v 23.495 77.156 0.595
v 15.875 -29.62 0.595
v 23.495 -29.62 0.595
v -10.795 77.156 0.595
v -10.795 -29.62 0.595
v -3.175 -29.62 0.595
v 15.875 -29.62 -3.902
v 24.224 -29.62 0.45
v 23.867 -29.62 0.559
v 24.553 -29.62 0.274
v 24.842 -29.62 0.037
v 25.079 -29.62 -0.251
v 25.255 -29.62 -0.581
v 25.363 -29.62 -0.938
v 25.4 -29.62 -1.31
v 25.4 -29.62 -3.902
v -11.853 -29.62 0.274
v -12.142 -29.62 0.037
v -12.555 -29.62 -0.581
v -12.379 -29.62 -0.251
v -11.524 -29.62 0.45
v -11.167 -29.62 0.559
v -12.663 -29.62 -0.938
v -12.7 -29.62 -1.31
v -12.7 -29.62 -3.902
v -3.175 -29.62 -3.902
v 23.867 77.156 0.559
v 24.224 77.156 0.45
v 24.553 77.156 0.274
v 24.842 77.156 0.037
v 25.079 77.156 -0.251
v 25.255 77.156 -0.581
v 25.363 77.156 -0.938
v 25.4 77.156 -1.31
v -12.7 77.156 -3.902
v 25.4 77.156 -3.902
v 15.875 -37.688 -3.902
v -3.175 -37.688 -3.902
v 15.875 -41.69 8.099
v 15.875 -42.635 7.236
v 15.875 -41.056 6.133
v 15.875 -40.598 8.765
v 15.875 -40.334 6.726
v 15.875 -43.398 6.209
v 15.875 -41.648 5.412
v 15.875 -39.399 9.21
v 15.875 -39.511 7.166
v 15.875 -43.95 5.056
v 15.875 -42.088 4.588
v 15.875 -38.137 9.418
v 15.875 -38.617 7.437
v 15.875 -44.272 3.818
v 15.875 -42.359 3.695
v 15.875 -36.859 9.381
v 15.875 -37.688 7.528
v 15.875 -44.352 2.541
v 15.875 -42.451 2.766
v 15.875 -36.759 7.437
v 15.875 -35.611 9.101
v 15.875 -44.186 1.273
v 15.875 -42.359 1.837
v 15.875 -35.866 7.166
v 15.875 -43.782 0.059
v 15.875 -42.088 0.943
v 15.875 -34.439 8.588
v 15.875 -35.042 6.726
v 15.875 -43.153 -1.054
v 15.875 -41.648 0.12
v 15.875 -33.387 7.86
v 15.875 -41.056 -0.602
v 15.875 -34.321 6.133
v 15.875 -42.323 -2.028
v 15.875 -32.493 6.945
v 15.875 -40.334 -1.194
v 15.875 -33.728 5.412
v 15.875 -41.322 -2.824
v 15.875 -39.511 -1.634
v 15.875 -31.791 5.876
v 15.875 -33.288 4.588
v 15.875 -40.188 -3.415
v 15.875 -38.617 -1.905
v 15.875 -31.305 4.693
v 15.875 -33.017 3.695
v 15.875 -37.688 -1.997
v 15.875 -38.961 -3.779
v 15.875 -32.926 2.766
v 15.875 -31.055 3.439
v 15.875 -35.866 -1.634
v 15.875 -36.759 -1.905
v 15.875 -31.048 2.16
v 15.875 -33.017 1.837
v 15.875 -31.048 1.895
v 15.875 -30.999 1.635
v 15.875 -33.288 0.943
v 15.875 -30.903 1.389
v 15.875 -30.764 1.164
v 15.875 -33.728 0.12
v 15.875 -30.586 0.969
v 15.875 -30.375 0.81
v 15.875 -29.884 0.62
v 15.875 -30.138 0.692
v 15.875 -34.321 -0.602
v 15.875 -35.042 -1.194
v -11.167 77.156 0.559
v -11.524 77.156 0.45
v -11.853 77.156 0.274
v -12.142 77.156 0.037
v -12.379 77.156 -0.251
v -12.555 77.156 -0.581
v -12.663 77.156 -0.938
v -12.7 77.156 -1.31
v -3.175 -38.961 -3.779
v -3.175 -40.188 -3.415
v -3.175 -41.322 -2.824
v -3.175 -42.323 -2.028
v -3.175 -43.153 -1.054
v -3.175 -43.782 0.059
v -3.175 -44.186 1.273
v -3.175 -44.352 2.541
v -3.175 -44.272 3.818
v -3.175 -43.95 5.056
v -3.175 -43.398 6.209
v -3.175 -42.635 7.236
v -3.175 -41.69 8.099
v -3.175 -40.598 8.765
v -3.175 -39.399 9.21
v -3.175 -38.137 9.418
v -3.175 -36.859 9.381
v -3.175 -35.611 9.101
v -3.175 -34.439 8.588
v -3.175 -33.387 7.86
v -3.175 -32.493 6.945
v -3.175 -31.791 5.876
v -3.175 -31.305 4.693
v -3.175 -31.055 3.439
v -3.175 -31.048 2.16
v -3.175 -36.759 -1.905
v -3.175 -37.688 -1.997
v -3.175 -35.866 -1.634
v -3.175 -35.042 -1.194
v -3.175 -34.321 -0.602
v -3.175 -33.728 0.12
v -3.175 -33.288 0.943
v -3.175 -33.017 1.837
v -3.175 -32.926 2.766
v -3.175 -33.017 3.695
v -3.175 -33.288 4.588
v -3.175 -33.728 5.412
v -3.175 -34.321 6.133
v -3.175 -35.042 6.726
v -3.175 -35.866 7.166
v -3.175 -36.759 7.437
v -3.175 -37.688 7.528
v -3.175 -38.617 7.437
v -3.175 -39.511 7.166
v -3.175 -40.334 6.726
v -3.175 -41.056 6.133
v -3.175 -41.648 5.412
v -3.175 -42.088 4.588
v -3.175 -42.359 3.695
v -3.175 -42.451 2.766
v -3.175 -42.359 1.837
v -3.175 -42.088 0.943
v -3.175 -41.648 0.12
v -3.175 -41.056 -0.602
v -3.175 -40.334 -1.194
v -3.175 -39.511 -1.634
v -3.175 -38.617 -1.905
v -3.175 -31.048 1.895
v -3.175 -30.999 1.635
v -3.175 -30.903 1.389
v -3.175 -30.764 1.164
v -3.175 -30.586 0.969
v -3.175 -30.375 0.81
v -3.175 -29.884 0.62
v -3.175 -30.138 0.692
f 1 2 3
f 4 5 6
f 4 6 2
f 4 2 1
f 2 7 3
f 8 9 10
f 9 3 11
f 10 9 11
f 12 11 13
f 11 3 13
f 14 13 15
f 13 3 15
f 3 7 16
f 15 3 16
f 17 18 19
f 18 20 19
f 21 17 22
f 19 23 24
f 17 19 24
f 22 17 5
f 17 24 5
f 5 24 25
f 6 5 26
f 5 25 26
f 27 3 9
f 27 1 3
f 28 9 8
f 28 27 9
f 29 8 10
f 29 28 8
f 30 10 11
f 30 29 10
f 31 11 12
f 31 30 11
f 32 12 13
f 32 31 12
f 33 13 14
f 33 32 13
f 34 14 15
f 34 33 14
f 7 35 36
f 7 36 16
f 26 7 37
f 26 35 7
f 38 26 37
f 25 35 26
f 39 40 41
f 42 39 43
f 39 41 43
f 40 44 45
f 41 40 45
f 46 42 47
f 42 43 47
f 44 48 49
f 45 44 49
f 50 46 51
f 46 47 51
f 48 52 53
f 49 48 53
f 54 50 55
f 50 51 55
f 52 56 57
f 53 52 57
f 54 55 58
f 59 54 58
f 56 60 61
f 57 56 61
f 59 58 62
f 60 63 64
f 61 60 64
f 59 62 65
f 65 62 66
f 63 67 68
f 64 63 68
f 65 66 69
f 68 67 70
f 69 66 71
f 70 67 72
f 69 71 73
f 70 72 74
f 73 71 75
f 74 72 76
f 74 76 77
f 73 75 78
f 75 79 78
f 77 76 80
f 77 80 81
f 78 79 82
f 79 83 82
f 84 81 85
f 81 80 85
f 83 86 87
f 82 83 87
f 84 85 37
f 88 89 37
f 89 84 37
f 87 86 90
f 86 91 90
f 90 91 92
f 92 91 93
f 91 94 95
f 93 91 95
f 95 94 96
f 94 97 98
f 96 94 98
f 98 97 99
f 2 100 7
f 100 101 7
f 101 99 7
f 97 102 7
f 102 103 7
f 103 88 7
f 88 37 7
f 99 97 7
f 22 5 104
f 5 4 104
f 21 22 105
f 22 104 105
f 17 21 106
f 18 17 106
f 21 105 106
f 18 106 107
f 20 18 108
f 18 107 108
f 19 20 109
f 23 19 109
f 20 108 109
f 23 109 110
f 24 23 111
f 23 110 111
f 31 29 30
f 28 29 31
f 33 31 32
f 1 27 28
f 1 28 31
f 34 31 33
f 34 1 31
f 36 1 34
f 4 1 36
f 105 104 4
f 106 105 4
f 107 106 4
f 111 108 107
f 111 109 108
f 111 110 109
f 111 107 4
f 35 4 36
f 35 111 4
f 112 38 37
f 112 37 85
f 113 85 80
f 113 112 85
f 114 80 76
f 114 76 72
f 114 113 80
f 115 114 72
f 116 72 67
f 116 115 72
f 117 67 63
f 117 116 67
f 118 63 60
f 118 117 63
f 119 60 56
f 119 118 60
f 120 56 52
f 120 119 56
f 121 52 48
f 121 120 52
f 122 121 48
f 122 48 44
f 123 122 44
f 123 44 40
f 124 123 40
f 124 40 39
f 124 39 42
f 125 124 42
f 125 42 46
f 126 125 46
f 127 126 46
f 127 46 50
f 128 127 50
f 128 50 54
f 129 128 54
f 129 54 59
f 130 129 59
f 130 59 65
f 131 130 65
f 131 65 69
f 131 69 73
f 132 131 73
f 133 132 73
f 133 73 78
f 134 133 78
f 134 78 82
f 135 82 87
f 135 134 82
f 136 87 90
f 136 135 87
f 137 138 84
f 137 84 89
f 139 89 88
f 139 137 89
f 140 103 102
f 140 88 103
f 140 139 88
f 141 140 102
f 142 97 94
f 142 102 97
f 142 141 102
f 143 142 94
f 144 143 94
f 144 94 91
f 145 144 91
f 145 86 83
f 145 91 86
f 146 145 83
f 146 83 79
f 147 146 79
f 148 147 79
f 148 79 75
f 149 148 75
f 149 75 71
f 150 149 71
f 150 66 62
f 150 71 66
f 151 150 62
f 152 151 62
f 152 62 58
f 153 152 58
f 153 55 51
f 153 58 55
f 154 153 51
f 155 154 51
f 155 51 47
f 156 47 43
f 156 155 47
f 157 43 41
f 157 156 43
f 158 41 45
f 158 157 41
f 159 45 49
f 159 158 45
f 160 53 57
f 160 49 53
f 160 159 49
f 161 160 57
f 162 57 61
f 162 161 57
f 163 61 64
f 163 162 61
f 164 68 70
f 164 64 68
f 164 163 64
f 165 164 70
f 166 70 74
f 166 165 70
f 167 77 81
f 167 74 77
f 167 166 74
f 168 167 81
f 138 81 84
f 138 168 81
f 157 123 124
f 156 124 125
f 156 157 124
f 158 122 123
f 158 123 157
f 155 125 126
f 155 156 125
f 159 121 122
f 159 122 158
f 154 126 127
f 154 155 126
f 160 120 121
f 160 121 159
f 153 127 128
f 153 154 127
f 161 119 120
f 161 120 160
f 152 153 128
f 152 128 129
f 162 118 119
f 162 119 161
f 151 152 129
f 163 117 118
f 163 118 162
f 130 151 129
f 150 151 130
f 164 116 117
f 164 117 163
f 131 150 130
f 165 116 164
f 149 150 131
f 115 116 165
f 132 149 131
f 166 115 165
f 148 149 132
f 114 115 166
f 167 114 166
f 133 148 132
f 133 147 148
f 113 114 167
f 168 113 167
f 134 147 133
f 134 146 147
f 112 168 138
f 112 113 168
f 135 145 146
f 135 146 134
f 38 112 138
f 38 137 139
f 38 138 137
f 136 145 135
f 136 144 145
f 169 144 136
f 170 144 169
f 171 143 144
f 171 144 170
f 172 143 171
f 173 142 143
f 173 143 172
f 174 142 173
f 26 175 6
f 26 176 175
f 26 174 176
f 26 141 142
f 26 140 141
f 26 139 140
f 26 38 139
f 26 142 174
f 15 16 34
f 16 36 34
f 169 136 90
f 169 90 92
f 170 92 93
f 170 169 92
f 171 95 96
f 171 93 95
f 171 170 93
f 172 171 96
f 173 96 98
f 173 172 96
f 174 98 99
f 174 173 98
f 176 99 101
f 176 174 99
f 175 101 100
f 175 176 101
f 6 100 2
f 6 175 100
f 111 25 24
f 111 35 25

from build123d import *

# Parameters (mm, degrees)
SKETCH2_R               = 1.5875
BOSS_EXTRUDE1_DEPTH     = 12.7
CUT_EXTRUDE3_DEPTH      = 12.7
CUT_EXTRUDE3_DEPTH_BACK = 12.7
SKETCH4_W               = 3.175
SKETCH4_H               = 5.378529074
SKETCH4_W_2             = 3.429175225
FILLET4_R               = 0.635
SCALE1_SCALE            = 3


with BuildPart() as part:
    # Sketch2 → Boss-Extrude1 (new body)
    with BuildSketch(Plane(origin=(0, 0, 0), x_dir=(0, 0, -1), z_dir=(1, 0, 0))):
        with BuildLine():
            Line((0.7234417, 2.689264537), (0.7234417, 38.281333312))
            Line((0.7234417, 38.281333312), (2.2225, 38.281333312))
            Line((2.2225, 38.281333312), (2.2225, 0))
            ThreePointArc((2.2225, 0), (-1.641425032, -1.498409194), (0.202045455, 2.213297062))
            ThreePointArc((0.202045455, 2.213297062), (0.567726646, 2.33627761), (0.7234417, 2.689264537))
        make_face()
        Circle(SKETCH2_R, mode=Mode.SUBTRACT)
    extrude(amount=BOSS_EXTRUDE1_DEPTH)

    # Sketch4 → Cut-Extrude3 (cut, two sides: drawn at the far end of the back side and taken through both)
    with BuildSketch(Plane.XY.offset(-0.7234417).offset(-CUT_EXTRUDE3_DEPTH_BACK)):
        with Locations((1.5875, 0)):
            Rectangle(SKETCH4_W, SKETCH4_H)
        with Locations((11.239587612, 0)):
            Rectangle(SKETCH4_W_2, SKETCH4_H)
    extrude(amount=CUT_EXTRUDE3_DEPTH + CUT_EXTRUDE3_DEPTH_BACK, mode=Mode.SUBTRACT)

    # Fillet4
    fillet4_edges = [part.edges().sort_by_distance(p)[0] for p in [
        (12.7, 20.485298925, -0.7234417),
        (0, 20.485298925, -0.7234417),
    ]]
    fillet(fillet4_edges, radius=FILLET4_R)


with BuildPart() as part_1:
    # Scale1: scaled about (6.35, 18.844068161, -1.382882034)
    add(part.part.scale(SCALE1_SCALE).moved(Location((-12.7, -37.688136322, 2.765764068))))


solid = part_1.part
